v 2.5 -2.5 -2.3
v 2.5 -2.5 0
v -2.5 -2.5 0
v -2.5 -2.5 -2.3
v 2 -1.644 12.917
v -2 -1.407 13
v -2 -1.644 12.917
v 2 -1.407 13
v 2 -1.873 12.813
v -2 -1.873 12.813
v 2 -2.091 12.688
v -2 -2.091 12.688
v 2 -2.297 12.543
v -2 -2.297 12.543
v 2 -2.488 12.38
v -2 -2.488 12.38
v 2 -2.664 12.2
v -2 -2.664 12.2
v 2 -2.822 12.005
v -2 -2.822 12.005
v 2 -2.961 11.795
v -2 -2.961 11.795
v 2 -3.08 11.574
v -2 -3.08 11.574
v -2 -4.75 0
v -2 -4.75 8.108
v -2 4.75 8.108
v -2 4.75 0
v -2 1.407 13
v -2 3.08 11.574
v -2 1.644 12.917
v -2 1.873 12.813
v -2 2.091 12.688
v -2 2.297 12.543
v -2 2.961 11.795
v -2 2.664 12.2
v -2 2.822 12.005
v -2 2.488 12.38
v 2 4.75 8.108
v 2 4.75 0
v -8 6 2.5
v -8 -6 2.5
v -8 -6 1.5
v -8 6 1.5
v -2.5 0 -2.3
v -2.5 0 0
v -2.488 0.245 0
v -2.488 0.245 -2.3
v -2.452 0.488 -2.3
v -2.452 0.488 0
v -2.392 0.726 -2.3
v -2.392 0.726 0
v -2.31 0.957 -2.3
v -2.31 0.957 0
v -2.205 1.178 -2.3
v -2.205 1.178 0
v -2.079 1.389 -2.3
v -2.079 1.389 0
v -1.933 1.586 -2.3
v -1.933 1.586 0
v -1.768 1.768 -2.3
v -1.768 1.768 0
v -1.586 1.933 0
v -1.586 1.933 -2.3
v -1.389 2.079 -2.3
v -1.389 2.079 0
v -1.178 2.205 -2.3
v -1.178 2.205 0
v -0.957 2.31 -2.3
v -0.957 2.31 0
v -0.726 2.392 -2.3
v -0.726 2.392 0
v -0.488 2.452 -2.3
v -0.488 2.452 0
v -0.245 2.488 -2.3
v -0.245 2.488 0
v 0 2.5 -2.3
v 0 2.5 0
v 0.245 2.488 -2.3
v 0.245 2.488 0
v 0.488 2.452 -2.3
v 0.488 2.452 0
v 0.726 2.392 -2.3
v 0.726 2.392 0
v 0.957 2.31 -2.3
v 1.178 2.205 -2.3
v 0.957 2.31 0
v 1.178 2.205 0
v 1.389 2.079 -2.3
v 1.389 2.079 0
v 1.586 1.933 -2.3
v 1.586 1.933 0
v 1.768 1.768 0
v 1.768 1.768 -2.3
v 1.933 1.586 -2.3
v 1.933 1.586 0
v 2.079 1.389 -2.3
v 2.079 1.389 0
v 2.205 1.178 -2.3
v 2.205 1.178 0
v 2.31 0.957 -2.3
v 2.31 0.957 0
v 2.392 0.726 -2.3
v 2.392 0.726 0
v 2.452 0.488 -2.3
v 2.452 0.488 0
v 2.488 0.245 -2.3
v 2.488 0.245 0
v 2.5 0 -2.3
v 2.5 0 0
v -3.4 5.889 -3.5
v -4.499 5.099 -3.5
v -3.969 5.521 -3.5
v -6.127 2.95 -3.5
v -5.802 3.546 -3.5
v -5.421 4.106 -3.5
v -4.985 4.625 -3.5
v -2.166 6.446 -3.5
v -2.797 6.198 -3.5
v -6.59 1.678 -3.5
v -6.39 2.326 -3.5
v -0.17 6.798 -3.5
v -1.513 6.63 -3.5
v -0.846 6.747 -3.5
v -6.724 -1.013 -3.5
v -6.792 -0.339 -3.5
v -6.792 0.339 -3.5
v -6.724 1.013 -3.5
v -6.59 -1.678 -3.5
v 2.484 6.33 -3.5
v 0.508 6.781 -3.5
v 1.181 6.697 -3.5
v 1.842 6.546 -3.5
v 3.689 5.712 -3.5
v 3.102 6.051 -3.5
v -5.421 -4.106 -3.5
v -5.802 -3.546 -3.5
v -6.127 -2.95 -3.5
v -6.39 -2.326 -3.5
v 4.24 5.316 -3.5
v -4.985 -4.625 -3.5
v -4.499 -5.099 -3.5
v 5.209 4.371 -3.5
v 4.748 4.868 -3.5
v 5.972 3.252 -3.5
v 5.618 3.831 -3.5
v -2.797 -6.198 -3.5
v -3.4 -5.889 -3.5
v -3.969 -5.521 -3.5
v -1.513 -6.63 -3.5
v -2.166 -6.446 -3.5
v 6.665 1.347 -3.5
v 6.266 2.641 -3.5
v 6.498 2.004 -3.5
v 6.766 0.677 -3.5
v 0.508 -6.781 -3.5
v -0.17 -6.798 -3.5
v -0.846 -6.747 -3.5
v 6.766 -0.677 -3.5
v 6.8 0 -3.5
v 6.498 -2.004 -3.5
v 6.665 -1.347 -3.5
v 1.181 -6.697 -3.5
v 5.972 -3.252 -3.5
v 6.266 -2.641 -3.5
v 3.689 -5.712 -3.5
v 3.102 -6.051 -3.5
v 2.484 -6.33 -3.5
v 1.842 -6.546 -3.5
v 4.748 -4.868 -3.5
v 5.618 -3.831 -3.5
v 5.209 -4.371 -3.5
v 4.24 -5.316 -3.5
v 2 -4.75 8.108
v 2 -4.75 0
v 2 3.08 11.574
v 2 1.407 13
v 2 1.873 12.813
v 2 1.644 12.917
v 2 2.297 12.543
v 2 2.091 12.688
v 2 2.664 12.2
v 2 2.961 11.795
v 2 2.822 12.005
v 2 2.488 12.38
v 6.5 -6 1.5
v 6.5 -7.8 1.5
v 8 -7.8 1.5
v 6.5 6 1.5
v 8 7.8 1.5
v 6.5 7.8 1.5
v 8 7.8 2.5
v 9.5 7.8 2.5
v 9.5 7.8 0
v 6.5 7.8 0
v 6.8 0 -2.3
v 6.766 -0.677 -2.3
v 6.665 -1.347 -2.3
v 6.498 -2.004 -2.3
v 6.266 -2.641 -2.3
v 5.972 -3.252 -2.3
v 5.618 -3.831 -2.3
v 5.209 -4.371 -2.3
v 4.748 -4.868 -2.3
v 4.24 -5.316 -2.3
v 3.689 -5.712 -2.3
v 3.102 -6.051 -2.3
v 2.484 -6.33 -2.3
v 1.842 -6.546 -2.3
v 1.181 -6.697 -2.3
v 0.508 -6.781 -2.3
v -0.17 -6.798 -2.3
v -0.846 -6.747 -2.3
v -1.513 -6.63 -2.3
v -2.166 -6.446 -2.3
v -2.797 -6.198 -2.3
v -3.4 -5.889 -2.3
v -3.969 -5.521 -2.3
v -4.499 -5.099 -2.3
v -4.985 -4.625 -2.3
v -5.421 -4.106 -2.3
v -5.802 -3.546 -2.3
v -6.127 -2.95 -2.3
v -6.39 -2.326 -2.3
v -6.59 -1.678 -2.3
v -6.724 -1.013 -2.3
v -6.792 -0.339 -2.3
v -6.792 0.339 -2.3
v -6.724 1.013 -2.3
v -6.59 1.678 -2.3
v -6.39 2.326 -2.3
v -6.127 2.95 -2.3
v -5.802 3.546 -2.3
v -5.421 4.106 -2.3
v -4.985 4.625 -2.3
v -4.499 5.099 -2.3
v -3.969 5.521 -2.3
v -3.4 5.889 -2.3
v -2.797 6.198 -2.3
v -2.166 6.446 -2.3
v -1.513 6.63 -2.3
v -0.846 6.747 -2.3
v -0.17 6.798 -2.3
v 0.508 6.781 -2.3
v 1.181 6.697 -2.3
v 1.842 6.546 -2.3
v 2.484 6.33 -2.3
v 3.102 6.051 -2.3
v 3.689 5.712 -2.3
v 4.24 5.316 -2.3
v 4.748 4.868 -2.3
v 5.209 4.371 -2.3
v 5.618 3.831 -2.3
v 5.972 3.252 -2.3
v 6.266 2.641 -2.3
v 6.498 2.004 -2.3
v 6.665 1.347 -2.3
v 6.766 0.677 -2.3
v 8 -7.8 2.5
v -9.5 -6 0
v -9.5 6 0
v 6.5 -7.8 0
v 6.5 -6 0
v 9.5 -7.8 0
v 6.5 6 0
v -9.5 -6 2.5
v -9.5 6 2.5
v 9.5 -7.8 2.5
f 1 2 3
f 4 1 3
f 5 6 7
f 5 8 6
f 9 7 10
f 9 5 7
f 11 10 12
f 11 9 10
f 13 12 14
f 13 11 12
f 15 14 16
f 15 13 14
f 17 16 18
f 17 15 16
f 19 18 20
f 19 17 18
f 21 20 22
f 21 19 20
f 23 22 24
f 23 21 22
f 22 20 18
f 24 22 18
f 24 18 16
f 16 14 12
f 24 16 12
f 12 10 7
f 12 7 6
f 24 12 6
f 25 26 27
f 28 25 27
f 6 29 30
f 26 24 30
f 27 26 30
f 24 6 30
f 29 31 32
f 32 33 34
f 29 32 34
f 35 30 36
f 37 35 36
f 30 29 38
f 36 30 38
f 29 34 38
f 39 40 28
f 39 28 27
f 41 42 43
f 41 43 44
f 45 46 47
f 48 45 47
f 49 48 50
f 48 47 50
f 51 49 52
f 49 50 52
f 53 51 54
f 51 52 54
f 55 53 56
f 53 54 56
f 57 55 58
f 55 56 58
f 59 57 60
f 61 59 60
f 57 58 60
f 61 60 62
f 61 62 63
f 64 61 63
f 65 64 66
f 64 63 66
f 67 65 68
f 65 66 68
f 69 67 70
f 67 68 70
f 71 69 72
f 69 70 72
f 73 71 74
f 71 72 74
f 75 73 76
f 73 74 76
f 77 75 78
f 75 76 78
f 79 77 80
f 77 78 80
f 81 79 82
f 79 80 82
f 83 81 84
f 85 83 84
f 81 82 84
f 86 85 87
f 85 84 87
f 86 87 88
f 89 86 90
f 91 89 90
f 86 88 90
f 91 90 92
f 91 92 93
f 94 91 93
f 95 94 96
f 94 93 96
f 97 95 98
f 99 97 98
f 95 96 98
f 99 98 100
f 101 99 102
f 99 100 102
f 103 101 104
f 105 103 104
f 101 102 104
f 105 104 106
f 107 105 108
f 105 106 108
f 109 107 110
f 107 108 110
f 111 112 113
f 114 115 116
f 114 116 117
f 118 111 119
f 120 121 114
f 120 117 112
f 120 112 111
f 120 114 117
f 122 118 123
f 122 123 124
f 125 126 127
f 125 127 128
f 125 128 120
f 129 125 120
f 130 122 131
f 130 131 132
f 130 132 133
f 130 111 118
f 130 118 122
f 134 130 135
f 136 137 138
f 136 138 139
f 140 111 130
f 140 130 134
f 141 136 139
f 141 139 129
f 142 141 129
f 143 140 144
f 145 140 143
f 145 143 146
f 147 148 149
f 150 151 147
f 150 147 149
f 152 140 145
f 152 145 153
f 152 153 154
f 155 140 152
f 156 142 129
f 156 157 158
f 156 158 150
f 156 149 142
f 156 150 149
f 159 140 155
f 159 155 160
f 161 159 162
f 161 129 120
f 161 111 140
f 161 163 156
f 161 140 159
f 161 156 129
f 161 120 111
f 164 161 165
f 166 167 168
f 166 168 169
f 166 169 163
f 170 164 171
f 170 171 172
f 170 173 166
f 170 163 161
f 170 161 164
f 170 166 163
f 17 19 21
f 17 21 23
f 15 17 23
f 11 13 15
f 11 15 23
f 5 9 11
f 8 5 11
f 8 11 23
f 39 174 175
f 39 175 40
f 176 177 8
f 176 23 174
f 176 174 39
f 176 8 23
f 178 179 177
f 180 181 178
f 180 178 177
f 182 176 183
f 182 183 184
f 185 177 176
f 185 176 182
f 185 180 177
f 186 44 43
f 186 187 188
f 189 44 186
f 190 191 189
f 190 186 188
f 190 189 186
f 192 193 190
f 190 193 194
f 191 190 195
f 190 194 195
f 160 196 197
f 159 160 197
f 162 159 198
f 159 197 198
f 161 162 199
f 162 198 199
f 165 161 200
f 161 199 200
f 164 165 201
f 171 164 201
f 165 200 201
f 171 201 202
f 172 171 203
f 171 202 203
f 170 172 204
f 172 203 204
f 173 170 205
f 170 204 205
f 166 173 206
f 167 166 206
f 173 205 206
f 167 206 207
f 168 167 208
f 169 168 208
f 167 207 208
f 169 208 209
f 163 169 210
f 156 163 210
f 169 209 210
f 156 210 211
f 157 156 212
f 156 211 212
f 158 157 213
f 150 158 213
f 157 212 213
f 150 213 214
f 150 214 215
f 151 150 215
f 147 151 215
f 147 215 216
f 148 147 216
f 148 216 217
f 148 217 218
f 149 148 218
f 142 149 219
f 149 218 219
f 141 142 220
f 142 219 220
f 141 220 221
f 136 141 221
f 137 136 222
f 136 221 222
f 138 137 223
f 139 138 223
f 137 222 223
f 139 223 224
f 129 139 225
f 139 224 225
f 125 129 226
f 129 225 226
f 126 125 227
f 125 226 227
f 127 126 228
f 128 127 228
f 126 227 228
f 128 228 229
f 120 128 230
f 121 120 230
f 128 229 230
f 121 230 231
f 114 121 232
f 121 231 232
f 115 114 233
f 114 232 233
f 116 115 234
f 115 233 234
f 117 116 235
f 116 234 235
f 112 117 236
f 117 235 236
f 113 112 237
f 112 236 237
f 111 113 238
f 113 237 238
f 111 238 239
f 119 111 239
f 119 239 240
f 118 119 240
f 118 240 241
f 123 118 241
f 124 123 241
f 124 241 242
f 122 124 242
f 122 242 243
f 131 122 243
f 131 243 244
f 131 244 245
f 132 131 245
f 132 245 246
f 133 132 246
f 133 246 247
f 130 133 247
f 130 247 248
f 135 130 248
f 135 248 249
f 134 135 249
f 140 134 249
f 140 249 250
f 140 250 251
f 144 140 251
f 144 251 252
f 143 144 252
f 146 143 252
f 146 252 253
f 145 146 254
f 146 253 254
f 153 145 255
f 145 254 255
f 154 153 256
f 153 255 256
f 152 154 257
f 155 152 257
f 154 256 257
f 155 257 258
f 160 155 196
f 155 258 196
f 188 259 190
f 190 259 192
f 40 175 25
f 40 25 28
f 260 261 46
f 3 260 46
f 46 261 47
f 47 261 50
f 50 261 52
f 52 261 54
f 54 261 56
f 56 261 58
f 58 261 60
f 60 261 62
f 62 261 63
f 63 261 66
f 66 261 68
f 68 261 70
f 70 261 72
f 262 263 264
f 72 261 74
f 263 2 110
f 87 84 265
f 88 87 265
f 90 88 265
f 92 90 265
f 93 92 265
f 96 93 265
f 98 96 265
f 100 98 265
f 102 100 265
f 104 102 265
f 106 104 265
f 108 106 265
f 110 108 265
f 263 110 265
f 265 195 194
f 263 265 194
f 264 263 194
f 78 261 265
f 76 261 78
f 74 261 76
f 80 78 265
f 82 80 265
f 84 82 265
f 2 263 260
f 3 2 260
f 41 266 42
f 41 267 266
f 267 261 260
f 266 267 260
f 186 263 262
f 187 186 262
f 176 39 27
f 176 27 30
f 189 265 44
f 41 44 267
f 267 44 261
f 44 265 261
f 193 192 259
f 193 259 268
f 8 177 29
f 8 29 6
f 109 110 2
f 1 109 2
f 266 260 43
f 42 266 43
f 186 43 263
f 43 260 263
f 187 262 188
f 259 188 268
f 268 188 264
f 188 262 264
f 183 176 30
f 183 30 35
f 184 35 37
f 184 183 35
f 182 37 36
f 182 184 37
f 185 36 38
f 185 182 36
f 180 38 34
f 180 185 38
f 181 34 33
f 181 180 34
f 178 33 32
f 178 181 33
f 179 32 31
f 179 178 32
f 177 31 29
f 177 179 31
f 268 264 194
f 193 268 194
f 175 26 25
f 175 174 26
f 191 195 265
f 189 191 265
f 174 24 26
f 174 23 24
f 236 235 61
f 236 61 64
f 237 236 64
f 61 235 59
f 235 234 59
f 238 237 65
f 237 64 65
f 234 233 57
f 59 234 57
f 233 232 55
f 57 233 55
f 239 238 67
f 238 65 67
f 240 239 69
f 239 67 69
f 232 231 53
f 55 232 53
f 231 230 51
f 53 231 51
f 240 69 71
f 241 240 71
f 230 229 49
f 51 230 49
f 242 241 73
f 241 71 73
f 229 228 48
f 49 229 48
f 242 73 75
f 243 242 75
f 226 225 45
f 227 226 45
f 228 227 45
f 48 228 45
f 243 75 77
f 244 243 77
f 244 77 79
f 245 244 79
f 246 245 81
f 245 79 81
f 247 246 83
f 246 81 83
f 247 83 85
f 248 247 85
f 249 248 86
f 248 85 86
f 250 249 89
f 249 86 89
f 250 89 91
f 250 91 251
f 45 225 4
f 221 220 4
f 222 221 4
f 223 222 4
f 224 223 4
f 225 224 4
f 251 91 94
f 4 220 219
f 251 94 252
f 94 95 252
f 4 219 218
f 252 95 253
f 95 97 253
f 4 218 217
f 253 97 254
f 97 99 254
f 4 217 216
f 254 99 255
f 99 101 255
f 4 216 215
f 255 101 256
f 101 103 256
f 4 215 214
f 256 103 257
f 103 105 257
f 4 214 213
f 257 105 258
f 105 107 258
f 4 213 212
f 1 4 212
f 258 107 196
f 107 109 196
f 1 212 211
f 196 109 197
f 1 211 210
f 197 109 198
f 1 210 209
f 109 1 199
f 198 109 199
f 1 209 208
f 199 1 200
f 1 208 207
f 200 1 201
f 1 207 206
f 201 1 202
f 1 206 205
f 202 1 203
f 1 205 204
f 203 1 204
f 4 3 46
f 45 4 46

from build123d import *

# Parameters (mm, degrees)
F1_DEPTH      = 2.5
F2_W          = 16
F2_H          = 19.2862
F3_DEPTH      = 1
F5_DEPTH      = 2.3
F6_R          = 6.8
F7_DEPTH      = 1.2
F9_DEPTH      = 2
F9_DEPTH_BACK = 2


with BuildPart() as f1:
    # F0 (on Top) → F1 (new body)
    with BuildSketch(Plane.XY):
        Polygon((6.5, -7.8), (9.5, -7.8), (9.5, 7.8), (6.5, 7.8), (6.5, 6), (-9.5, 6), (-9.5, -6), (6.5, -6), align=None)
    extrude(amount=F1_DEPTH)

    # F2 (on face) → F3 (cut)
    with BuildSketch(Plane.XY.offset(2.5)):
        Rectangle(F2_W, F2_H)
    extrude(amount=-F3_DEPTH, mode=Mode.SUBTRACT)

    # F4 (on face) → F5 (join)
    with BuildSketch(Plane(origin=(0, 0, 0), x_dir=(1, 0, 0), z_dir=(0, 0, -1))):
        with BuildLine():
            Line((-2.5, 2.5), (-2.5, 0))
            ThreePointArc((-2.5, 0), (0, -2.5), (2.5, 0))
            Line((2.5, 0), (2.5, 2.5))
            Line((2.5, 2.5), (-2.5, 2.5))
        make_face()
    extrude(amount=F5_DEPTH)

    # F6 (on face) → F7 (join)
    with BuildSketch(Plane(origin=(0, 0, -2.3), x_dir=(1, 0, 0), z_dir=(0, 0, -1))):
        Circle(F6_R)
    extrude(amount=F7_DEPTH)


with BuildPart() as f9:
    # F8 (on Right) → F9 (new body, two sides)
    with BuildSketch(Plane.YZ) as f9_sk:
        with BuildLine():
            Line((-4.75, 8.108116), (-4.75, 0))
            Line((-4.75, 0), (4.75, 0))
            Line((4.75, 0), (4.75, 8.108116))
            Line((4.75, 8.108116), (3.080489, 11.57426))
            ThreePointArc((3.080489, 11.57426), (2.394246, 12.463895), (1.40684, 13))
            Line((1.40684, 13), (0, 13))
            Line((0, 13), (-1.40684, 13))
            ThreePointArc((-1.40684, 13), (-2.394246, 12.463895), (-3.080489, 11.57426))
            Line((-3.080489, 11.57426), (-4.75, 8.108116))
        make_face()
    extrude(amount=F9_DEPTH)
    extrude(f9_sk.sketch, amount=-F9_DEPTH_BACK)


solid = Compound([f1.part, f9.part])
